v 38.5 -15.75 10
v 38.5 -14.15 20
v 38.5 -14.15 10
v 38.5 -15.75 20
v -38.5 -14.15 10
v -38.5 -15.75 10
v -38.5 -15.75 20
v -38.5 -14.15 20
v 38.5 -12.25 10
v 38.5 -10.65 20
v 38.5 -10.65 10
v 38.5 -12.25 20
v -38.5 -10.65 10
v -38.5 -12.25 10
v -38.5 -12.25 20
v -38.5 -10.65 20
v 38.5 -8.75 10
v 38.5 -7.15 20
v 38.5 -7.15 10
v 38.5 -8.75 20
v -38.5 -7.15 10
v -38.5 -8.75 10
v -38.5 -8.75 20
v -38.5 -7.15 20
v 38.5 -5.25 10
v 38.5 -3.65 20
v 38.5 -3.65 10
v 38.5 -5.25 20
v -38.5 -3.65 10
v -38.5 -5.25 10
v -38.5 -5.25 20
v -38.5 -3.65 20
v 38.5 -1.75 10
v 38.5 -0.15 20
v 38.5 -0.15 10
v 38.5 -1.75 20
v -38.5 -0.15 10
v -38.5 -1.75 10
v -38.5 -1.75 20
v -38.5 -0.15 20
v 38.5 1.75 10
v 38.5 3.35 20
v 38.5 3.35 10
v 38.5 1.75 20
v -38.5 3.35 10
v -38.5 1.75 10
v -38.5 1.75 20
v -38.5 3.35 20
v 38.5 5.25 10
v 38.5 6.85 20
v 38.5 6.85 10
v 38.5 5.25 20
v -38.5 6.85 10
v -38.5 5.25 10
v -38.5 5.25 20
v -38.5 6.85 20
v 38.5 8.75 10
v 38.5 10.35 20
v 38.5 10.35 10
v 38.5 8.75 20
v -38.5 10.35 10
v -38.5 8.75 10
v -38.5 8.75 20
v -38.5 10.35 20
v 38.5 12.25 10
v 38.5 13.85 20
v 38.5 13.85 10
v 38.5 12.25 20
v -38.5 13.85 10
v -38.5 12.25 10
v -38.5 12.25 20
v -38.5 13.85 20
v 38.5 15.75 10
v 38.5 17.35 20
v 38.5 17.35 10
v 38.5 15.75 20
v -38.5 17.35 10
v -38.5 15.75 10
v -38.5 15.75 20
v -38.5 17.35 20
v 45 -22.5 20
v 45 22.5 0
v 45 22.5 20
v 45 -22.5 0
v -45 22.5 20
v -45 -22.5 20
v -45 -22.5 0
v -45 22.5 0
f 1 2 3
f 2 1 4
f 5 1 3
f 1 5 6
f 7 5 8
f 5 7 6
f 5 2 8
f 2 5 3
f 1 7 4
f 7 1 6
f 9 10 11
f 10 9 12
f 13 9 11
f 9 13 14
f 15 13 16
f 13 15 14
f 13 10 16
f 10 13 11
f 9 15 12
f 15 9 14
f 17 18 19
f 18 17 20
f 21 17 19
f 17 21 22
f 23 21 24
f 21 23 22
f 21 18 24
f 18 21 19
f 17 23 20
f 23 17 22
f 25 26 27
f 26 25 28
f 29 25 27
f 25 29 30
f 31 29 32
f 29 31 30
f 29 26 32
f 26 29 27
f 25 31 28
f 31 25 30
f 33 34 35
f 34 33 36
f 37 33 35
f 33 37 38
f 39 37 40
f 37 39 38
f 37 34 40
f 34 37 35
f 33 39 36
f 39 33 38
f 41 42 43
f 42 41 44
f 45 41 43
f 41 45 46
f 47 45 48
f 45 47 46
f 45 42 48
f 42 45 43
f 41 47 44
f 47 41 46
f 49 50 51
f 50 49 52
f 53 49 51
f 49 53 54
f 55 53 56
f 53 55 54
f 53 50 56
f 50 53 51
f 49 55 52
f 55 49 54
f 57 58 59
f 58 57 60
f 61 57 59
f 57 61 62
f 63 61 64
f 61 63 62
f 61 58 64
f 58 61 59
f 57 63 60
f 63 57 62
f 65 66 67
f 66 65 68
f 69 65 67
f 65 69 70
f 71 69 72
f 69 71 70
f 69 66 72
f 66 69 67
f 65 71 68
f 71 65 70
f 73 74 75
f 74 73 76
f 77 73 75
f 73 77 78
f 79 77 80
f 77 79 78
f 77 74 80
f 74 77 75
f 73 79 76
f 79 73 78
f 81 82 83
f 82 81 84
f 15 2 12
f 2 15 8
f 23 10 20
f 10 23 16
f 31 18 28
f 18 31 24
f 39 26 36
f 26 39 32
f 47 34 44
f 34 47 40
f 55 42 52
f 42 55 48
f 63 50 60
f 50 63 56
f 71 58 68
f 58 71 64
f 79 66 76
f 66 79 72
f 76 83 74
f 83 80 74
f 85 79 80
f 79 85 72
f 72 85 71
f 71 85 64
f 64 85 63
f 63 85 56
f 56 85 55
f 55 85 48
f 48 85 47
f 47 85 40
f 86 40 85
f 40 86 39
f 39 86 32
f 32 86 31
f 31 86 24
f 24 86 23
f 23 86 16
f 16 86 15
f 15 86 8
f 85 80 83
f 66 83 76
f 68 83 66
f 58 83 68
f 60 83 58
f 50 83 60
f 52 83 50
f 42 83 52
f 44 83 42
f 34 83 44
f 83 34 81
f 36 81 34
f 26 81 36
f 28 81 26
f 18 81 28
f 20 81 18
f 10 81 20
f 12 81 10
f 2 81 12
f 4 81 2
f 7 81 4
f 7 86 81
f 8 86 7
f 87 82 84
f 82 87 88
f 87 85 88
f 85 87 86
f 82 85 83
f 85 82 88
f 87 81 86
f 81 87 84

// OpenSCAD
// Microscope slide drying rack
// Print orientation: base on XY plane, slots open upward (+Z)

// ---------------- Parameters ----------------
block_len    = 90;    // block length along X (mm)
block_wid    = 45;    // block width along Y (mm)
block_h      = 20;    // block height along Z (mm)

slot_count   = 10;    // number of slide slots
slot_len     = 77;    // slot length along X (mm)
slot_w       = 1.6;   // slot width along Y (mm)
slot_depth   = 10;    // slot depth from top face (mm)
slot_pitch   = 3.5;   // centre-to-centre slot spacing in Y (mm)

eps          = 0.5;   // overcut past top face to avoid coplanar faces (mm)

$fn = 64;

// ---------------- Model ----------------
difference() {
    // Base block, centred in X and Y
    translate([-block_len/2, -block_wid/2, 0])
        cube([block_len, block_wid, block_h]);

    // Slot group, centred on the block in X and Y
    for (i = [0 : slot_count - 1]) {
        y = (i - (slot_count - 1)/2) * slot_pitch;
        translate([-slot_len/2, y, block_h - slot_depth])
            cube([slot_len, slot_w, slot_depth + eps]);
    }
}
